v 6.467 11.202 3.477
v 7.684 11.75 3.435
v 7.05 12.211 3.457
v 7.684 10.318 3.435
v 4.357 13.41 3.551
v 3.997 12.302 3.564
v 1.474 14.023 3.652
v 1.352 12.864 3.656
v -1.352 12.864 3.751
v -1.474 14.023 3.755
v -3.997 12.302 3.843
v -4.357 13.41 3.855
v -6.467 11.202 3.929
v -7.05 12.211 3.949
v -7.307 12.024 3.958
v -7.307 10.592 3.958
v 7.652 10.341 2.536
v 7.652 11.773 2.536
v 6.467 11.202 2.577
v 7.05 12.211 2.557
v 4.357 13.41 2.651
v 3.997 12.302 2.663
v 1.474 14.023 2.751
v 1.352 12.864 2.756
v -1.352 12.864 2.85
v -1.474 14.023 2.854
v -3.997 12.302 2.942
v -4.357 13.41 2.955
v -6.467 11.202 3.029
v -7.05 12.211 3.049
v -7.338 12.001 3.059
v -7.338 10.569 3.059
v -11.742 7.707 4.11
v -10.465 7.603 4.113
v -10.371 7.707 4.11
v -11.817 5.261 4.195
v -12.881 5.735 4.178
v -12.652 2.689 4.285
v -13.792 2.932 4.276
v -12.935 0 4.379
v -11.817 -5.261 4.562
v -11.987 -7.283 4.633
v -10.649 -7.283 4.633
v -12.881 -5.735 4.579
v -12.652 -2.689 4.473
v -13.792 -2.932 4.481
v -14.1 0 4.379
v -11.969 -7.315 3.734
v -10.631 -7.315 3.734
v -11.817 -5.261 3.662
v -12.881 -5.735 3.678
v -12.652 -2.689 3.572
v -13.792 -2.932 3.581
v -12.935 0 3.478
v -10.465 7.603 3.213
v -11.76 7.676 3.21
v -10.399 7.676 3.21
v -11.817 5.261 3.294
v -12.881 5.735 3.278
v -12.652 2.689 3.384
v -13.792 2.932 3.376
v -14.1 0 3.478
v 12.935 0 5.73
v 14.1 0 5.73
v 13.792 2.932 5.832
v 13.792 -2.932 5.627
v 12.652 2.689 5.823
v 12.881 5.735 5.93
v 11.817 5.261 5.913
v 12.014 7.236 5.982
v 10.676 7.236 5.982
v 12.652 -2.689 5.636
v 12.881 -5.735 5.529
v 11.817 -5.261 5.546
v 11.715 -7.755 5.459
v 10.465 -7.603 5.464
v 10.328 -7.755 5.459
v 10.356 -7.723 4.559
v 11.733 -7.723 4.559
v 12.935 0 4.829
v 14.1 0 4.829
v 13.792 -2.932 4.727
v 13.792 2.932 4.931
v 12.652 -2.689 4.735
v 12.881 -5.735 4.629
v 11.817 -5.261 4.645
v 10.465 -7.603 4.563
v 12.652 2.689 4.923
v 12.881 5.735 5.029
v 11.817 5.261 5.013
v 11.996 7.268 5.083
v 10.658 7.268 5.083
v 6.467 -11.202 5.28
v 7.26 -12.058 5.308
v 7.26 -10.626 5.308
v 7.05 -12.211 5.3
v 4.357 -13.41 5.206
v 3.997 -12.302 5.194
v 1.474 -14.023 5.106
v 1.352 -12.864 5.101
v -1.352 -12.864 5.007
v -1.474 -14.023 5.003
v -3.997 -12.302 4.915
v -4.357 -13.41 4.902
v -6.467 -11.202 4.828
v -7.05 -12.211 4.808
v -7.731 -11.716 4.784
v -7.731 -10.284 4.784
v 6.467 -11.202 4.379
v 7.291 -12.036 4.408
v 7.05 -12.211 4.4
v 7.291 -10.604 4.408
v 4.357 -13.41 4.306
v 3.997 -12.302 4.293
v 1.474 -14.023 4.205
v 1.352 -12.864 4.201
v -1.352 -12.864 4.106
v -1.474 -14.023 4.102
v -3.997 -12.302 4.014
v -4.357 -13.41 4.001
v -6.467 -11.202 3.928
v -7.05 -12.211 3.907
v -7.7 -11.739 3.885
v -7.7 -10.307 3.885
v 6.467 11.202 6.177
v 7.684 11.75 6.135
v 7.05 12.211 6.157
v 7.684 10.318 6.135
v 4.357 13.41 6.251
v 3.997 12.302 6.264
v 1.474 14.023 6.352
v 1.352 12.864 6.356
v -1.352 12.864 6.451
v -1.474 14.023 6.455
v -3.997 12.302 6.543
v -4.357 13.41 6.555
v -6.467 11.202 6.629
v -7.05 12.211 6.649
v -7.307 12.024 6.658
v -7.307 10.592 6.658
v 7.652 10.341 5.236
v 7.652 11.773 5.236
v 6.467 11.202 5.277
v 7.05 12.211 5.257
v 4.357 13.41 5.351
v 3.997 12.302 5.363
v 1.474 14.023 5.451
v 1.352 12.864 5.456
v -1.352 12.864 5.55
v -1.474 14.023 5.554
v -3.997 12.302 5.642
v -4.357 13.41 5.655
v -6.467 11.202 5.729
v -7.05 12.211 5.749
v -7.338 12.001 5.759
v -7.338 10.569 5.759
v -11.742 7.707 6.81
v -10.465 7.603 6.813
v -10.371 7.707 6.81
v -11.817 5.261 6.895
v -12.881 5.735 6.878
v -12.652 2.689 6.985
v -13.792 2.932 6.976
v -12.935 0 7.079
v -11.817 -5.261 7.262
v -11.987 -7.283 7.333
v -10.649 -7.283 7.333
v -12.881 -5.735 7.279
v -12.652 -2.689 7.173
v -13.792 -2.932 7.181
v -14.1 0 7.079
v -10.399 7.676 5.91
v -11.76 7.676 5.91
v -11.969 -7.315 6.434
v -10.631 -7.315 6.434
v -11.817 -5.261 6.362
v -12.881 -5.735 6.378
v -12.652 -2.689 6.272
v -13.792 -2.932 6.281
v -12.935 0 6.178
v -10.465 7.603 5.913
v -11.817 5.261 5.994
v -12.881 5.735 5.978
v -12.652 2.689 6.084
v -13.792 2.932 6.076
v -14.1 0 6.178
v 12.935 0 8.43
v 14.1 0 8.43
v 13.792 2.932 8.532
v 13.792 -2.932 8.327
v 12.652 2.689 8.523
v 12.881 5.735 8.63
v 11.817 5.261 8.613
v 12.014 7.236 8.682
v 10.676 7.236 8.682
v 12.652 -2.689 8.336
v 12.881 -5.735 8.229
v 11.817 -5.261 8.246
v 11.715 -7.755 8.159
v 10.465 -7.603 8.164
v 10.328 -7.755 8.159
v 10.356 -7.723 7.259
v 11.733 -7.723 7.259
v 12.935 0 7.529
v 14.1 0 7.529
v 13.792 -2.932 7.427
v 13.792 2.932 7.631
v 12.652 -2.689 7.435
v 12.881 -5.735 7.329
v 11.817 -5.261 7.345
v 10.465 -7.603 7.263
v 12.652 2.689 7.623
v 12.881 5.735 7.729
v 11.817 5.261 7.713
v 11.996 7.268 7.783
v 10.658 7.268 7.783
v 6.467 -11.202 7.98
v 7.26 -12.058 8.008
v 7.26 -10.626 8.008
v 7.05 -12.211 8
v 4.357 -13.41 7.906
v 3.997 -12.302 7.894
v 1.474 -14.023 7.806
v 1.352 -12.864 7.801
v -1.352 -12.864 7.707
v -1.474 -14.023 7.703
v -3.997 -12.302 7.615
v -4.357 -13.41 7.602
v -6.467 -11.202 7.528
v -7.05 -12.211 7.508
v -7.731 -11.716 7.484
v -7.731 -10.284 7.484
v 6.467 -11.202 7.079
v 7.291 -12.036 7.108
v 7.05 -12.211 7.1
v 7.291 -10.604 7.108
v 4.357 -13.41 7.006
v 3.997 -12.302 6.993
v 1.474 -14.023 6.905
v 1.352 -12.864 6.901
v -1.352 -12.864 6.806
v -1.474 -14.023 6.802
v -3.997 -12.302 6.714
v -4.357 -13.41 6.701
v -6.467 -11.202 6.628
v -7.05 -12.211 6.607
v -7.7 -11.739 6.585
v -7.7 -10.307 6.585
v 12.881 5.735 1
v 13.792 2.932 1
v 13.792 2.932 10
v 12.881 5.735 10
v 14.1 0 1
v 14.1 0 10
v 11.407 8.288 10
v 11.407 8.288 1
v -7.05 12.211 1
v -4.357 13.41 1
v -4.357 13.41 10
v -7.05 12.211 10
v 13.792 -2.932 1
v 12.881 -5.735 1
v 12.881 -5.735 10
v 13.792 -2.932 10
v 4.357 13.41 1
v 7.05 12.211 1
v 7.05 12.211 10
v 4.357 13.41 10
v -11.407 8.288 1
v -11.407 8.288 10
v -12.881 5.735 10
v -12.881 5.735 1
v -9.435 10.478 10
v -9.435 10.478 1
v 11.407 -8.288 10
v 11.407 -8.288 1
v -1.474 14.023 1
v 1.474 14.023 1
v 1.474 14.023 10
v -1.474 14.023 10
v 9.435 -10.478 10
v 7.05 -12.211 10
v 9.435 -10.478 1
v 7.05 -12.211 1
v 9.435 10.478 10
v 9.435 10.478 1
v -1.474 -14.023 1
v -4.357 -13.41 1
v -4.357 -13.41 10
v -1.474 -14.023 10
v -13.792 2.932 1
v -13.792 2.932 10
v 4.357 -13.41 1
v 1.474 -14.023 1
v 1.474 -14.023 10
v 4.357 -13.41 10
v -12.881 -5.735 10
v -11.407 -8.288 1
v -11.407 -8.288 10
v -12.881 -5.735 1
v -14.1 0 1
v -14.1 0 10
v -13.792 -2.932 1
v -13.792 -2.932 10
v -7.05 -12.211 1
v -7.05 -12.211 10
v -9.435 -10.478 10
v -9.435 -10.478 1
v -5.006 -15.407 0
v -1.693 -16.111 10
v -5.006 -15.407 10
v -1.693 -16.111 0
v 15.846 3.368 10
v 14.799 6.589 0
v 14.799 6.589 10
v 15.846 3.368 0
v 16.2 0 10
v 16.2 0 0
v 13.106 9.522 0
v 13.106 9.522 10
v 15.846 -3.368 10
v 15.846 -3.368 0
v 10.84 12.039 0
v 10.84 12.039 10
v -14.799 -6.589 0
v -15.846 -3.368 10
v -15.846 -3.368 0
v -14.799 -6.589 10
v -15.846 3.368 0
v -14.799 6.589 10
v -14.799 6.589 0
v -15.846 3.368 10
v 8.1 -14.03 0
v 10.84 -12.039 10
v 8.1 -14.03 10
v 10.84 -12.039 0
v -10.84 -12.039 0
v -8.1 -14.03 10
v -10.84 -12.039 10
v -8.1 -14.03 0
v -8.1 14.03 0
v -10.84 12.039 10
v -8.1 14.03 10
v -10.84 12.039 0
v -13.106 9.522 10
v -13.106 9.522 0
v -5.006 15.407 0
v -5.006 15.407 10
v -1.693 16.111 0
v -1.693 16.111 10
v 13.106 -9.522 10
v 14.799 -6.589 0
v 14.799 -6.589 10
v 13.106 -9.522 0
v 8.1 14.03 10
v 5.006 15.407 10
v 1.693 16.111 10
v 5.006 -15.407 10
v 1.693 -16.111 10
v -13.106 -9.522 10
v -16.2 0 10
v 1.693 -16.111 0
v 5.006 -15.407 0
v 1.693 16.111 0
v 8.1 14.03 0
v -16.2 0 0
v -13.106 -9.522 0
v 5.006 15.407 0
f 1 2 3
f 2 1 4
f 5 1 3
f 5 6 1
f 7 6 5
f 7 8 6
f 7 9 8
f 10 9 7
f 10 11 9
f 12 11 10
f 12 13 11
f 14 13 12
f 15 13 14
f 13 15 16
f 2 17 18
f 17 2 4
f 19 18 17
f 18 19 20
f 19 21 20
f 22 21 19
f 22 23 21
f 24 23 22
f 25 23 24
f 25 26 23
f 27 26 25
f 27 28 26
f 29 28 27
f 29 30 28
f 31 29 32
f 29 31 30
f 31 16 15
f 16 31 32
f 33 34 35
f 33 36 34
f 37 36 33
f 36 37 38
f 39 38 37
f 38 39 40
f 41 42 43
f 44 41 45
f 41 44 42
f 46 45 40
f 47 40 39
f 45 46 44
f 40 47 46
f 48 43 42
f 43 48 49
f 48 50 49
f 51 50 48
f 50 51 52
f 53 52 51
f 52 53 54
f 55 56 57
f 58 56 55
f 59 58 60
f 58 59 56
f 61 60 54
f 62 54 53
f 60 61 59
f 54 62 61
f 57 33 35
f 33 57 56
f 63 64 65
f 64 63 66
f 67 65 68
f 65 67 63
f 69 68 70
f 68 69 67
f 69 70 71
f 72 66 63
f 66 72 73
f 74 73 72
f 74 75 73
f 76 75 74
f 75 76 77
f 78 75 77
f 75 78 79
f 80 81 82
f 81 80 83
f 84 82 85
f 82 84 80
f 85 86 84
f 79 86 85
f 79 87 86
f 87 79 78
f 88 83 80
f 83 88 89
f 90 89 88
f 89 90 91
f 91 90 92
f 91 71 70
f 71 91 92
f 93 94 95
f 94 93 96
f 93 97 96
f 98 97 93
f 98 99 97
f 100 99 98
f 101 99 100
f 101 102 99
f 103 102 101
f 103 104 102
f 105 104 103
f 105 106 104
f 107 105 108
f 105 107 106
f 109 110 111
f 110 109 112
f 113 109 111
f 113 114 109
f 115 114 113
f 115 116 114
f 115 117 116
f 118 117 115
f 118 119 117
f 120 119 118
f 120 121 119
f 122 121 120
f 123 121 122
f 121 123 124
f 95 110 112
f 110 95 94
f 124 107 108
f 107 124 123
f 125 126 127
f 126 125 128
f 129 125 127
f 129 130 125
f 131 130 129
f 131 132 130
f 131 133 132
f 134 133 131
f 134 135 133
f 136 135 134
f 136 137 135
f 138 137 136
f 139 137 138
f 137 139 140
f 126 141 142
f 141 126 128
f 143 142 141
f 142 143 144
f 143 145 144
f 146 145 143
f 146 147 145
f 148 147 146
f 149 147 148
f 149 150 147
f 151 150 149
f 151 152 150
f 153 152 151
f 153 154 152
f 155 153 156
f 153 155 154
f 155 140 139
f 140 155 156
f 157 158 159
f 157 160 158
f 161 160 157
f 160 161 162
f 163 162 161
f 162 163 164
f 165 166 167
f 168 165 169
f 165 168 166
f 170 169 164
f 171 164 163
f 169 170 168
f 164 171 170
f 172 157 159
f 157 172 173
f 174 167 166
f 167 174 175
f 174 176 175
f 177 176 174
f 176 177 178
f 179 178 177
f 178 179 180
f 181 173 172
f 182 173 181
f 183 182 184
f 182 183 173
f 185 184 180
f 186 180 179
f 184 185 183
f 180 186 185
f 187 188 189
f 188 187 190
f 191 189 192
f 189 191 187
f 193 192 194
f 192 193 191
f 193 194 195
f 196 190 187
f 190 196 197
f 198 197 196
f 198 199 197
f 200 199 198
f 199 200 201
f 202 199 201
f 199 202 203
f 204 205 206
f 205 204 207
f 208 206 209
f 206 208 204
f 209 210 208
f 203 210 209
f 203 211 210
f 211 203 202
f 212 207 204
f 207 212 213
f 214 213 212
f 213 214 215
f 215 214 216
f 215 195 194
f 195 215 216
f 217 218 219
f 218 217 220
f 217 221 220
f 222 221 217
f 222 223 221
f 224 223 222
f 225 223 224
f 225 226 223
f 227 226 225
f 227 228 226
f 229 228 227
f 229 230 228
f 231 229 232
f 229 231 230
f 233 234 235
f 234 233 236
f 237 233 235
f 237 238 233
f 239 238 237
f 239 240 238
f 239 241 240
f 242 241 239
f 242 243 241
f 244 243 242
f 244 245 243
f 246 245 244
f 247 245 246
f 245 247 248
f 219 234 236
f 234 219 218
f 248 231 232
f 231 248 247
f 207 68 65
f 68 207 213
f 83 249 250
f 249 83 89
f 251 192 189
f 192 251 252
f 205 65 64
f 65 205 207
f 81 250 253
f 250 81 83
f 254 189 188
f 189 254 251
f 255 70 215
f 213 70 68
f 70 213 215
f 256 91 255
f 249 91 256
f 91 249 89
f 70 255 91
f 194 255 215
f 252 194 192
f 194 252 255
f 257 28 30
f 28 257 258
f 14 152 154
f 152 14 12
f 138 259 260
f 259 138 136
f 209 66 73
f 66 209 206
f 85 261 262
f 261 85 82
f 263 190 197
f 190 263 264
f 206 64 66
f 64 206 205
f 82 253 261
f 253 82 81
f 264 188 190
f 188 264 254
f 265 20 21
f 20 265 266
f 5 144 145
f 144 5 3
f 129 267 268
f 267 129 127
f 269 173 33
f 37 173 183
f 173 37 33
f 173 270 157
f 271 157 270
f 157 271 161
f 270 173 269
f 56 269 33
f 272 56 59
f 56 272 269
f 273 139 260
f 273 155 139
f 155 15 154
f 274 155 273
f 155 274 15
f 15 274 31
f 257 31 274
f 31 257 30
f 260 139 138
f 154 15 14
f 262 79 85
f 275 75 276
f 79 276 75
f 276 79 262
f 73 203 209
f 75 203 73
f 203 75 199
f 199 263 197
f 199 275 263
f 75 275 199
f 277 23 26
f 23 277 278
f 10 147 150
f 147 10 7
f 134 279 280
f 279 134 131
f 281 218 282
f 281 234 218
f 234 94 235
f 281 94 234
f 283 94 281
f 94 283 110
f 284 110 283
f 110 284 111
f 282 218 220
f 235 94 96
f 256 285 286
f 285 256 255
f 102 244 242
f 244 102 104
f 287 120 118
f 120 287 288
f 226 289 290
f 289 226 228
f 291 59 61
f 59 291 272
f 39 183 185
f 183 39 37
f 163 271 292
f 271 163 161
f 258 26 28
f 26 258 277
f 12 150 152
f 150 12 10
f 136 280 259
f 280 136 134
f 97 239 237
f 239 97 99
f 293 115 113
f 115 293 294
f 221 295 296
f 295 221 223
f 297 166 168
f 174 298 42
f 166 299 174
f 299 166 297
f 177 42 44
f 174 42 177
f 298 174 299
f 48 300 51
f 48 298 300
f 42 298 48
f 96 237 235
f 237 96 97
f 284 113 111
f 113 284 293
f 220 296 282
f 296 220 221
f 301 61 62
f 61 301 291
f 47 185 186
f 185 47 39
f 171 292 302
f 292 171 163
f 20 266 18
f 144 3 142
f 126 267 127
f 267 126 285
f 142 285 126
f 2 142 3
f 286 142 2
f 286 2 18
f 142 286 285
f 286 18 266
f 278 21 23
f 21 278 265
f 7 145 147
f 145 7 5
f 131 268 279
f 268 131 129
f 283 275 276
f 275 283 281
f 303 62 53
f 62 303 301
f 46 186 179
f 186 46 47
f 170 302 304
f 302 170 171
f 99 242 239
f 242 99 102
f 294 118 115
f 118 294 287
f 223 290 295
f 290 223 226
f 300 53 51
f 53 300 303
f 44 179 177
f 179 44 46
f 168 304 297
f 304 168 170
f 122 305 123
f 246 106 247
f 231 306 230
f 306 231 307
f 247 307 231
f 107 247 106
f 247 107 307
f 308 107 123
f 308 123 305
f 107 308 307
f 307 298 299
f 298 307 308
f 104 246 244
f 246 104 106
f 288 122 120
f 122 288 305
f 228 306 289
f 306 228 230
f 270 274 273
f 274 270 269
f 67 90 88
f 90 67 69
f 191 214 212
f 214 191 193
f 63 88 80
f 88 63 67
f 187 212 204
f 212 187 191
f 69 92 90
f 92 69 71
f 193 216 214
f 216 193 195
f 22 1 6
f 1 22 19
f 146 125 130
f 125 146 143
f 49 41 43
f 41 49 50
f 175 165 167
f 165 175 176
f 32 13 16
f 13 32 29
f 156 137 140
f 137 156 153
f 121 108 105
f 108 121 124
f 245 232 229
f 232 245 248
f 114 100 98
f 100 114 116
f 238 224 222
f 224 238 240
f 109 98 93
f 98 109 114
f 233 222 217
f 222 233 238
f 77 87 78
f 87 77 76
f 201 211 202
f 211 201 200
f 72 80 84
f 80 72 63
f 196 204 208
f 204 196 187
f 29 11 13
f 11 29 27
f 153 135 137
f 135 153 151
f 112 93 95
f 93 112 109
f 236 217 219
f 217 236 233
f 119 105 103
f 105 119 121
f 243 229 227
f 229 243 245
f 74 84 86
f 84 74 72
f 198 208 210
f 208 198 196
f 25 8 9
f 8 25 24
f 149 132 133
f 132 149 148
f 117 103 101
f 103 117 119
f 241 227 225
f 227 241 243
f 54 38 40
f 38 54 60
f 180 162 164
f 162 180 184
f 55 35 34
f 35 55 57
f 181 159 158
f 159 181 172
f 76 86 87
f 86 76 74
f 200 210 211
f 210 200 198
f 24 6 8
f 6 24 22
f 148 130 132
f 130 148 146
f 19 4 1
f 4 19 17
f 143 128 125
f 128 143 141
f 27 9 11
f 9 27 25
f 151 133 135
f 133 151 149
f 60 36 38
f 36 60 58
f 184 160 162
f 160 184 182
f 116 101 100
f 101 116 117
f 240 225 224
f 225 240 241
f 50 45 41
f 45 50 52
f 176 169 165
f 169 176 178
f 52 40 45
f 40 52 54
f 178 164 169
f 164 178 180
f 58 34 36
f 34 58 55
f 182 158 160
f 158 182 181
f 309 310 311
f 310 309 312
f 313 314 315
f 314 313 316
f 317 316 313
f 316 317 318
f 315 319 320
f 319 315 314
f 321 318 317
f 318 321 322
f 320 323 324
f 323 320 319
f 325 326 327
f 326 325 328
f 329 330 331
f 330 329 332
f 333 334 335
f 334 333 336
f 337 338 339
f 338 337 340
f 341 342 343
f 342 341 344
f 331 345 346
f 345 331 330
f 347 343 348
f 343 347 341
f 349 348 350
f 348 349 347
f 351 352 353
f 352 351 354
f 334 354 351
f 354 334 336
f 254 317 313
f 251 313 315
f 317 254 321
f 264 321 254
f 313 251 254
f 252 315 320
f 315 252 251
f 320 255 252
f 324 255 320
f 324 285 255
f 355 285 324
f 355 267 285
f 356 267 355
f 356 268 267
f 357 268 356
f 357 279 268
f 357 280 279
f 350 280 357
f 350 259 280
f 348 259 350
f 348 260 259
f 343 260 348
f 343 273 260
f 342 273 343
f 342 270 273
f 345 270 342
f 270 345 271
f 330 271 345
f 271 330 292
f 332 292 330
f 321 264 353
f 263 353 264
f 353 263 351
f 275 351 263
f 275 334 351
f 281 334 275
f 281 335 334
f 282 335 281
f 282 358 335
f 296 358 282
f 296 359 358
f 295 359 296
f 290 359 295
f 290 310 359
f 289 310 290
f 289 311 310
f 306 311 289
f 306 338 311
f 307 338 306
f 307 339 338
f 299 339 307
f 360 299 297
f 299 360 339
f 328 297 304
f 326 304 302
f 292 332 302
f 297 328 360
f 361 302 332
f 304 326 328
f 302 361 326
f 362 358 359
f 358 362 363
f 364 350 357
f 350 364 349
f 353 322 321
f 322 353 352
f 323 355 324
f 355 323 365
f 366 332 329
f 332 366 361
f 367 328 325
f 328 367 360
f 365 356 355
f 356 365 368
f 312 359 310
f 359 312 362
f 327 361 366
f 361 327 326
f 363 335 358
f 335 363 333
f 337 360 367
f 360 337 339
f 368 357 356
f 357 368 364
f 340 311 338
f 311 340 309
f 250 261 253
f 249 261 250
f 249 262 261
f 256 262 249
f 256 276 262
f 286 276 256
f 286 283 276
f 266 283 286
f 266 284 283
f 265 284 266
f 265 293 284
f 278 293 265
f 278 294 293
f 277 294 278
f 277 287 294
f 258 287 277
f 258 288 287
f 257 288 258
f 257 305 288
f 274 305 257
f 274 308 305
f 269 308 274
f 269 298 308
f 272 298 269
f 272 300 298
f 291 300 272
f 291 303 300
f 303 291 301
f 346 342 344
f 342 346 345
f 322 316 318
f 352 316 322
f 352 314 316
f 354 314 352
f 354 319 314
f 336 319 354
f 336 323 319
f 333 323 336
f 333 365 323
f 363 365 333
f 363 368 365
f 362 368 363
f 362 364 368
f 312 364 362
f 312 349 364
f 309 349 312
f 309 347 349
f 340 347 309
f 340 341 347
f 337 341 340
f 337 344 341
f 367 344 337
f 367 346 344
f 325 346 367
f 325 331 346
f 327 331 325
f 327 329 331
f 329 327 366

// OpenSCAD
// 2 Liter Bottle Holder
//
// (c) 2013 Laird Popkin, based on http://www.threadspecs.com/assets/Threadspecs/ISBT-PCO-1881-Finish-3784253-18.pdf.
// Credit to eagleapex for creating and then deleting http://www.thingiverse.com/thing:10489 
// which inspired me to create this.

part="cap"; // "threads" for the part to print, "neck" for the part to subtract from your part
clearance=0.4; // tune to get the right 'fit' for your printer

// Bottle params

bottleID=25.07;
bottleOD=27.4;
bottlePitch=2.7;
bottleHeight=9;
bottleAngle=2;
threadLen=15;

// holder params

holderOD=bottleOD+5;
holderOR=holderOD/2;

// funnel params

funnelOD=100;
funnelWall=2;

// Bottle Computations

threadHeight = bottlePitch/3;
echo("thread height ",threadHeight);
echo("thread depth ",(bottleOD-bottleID)/2);

module bottleNeck() {
	difference() {
		union() {
			translate([0,0,-0.5]) cylinder(r=bottleOD/2+clearance,h=bottleHeight+1);
			}
		union() {
			rotate([0,bottleAngle,0]) translate([-threadLen/2,0,bottleHeight/2]) cube([threadLen,bottleOD,threadHeight]);
			rotate([0,bottleAngle,90]) translate([-threadLen/2,0,bottleHeight/2+bottlePitch/4]) cube([threadLen,bottleOD,threadHeight]);
			rotate([0,bottleAngle,-90]) translate([-threadLen/2,0,bottleHeight/2+bottlePitch*3/4]) cube([threadLen,bottleOD,threadHeight]);
			rotate([0,bottleAngle,180]) translate([-threadLen/2,0,bottleHeight/2+bottlePitch/2]) cube([threadLen,bottleOD,threadHeight]);
			translate([0,0,-bottlePitch]) {
				rotate([0,bottleAngle,0]) translate([-threadLen/2,0,bottleHeight/2]) cube([threadLen,bottleOD,threadHeight]);
				rotate([0,bottleAngle,90]) translate([-threadLen/2,0,bottleHeight/2+bottlePitch/4]) cube([threadLen,bottleOD,threadHeight]);
				rotate([0,bottleAngle,-90]) translate([-threadLen/2,0,bottleHeight/2+bottlePitch*3/4]) cube([threadLen,bottleOD,threadHeight]);
				rotate([0,bottleAngle,180]) translate([-threadLen/2,0,bottleHeight/2+bottlePitch/2]) cube([threadLen,bottleOD,threadHeight]);
				}
			//translate([0,0,bottleHeight/2+bottlePitch/2]) rotate([0,0,90]) cube([10,bottleOD,threadHeight], center=true);
			}
		}
	translate([0,0,-1]) cylinder(r=bottleID/2+clearance,h=bottleHeight+2);
	}

module bottleHolder() {
	difference() {
		cylinder(r=holderOR,h=bottleHeight);
		bottleNeck();
		}
	}

module bottleCap() {
	translate([0,0,1]) bottleHolder();
	cylinder(r=holderOR, h=1);
	}

module funnel() {
	translate([0,0,bottleHeight]) difference() {
		difference() {
			cylinder(r=holderOR, h=funnelWall);
			translate([0,0,-.1]) cylinder(r=bottleID/2, h=funnelWall+.2);
			}
		}
	translate([0,0,bottleHeight+funnelWall]) difference() {
		cylinder(r1=holderOR,r2=funnelOD, h=funnelOD-bottleOD);
		translate([0,0,-.1]) cylinder(r1=bottleID/2,r2=funnelOD-funnelWall, h=funnelOD-bottleOD+.2);
		}
	bottleHolder();
	}

if (part=="threads") bottleHolder();;
if (part=="neck") bottleNeck();
if (part=="funnel") funnel();
if (part=="holder") bottleHolder();
if (part=="cap") bottleCap();
